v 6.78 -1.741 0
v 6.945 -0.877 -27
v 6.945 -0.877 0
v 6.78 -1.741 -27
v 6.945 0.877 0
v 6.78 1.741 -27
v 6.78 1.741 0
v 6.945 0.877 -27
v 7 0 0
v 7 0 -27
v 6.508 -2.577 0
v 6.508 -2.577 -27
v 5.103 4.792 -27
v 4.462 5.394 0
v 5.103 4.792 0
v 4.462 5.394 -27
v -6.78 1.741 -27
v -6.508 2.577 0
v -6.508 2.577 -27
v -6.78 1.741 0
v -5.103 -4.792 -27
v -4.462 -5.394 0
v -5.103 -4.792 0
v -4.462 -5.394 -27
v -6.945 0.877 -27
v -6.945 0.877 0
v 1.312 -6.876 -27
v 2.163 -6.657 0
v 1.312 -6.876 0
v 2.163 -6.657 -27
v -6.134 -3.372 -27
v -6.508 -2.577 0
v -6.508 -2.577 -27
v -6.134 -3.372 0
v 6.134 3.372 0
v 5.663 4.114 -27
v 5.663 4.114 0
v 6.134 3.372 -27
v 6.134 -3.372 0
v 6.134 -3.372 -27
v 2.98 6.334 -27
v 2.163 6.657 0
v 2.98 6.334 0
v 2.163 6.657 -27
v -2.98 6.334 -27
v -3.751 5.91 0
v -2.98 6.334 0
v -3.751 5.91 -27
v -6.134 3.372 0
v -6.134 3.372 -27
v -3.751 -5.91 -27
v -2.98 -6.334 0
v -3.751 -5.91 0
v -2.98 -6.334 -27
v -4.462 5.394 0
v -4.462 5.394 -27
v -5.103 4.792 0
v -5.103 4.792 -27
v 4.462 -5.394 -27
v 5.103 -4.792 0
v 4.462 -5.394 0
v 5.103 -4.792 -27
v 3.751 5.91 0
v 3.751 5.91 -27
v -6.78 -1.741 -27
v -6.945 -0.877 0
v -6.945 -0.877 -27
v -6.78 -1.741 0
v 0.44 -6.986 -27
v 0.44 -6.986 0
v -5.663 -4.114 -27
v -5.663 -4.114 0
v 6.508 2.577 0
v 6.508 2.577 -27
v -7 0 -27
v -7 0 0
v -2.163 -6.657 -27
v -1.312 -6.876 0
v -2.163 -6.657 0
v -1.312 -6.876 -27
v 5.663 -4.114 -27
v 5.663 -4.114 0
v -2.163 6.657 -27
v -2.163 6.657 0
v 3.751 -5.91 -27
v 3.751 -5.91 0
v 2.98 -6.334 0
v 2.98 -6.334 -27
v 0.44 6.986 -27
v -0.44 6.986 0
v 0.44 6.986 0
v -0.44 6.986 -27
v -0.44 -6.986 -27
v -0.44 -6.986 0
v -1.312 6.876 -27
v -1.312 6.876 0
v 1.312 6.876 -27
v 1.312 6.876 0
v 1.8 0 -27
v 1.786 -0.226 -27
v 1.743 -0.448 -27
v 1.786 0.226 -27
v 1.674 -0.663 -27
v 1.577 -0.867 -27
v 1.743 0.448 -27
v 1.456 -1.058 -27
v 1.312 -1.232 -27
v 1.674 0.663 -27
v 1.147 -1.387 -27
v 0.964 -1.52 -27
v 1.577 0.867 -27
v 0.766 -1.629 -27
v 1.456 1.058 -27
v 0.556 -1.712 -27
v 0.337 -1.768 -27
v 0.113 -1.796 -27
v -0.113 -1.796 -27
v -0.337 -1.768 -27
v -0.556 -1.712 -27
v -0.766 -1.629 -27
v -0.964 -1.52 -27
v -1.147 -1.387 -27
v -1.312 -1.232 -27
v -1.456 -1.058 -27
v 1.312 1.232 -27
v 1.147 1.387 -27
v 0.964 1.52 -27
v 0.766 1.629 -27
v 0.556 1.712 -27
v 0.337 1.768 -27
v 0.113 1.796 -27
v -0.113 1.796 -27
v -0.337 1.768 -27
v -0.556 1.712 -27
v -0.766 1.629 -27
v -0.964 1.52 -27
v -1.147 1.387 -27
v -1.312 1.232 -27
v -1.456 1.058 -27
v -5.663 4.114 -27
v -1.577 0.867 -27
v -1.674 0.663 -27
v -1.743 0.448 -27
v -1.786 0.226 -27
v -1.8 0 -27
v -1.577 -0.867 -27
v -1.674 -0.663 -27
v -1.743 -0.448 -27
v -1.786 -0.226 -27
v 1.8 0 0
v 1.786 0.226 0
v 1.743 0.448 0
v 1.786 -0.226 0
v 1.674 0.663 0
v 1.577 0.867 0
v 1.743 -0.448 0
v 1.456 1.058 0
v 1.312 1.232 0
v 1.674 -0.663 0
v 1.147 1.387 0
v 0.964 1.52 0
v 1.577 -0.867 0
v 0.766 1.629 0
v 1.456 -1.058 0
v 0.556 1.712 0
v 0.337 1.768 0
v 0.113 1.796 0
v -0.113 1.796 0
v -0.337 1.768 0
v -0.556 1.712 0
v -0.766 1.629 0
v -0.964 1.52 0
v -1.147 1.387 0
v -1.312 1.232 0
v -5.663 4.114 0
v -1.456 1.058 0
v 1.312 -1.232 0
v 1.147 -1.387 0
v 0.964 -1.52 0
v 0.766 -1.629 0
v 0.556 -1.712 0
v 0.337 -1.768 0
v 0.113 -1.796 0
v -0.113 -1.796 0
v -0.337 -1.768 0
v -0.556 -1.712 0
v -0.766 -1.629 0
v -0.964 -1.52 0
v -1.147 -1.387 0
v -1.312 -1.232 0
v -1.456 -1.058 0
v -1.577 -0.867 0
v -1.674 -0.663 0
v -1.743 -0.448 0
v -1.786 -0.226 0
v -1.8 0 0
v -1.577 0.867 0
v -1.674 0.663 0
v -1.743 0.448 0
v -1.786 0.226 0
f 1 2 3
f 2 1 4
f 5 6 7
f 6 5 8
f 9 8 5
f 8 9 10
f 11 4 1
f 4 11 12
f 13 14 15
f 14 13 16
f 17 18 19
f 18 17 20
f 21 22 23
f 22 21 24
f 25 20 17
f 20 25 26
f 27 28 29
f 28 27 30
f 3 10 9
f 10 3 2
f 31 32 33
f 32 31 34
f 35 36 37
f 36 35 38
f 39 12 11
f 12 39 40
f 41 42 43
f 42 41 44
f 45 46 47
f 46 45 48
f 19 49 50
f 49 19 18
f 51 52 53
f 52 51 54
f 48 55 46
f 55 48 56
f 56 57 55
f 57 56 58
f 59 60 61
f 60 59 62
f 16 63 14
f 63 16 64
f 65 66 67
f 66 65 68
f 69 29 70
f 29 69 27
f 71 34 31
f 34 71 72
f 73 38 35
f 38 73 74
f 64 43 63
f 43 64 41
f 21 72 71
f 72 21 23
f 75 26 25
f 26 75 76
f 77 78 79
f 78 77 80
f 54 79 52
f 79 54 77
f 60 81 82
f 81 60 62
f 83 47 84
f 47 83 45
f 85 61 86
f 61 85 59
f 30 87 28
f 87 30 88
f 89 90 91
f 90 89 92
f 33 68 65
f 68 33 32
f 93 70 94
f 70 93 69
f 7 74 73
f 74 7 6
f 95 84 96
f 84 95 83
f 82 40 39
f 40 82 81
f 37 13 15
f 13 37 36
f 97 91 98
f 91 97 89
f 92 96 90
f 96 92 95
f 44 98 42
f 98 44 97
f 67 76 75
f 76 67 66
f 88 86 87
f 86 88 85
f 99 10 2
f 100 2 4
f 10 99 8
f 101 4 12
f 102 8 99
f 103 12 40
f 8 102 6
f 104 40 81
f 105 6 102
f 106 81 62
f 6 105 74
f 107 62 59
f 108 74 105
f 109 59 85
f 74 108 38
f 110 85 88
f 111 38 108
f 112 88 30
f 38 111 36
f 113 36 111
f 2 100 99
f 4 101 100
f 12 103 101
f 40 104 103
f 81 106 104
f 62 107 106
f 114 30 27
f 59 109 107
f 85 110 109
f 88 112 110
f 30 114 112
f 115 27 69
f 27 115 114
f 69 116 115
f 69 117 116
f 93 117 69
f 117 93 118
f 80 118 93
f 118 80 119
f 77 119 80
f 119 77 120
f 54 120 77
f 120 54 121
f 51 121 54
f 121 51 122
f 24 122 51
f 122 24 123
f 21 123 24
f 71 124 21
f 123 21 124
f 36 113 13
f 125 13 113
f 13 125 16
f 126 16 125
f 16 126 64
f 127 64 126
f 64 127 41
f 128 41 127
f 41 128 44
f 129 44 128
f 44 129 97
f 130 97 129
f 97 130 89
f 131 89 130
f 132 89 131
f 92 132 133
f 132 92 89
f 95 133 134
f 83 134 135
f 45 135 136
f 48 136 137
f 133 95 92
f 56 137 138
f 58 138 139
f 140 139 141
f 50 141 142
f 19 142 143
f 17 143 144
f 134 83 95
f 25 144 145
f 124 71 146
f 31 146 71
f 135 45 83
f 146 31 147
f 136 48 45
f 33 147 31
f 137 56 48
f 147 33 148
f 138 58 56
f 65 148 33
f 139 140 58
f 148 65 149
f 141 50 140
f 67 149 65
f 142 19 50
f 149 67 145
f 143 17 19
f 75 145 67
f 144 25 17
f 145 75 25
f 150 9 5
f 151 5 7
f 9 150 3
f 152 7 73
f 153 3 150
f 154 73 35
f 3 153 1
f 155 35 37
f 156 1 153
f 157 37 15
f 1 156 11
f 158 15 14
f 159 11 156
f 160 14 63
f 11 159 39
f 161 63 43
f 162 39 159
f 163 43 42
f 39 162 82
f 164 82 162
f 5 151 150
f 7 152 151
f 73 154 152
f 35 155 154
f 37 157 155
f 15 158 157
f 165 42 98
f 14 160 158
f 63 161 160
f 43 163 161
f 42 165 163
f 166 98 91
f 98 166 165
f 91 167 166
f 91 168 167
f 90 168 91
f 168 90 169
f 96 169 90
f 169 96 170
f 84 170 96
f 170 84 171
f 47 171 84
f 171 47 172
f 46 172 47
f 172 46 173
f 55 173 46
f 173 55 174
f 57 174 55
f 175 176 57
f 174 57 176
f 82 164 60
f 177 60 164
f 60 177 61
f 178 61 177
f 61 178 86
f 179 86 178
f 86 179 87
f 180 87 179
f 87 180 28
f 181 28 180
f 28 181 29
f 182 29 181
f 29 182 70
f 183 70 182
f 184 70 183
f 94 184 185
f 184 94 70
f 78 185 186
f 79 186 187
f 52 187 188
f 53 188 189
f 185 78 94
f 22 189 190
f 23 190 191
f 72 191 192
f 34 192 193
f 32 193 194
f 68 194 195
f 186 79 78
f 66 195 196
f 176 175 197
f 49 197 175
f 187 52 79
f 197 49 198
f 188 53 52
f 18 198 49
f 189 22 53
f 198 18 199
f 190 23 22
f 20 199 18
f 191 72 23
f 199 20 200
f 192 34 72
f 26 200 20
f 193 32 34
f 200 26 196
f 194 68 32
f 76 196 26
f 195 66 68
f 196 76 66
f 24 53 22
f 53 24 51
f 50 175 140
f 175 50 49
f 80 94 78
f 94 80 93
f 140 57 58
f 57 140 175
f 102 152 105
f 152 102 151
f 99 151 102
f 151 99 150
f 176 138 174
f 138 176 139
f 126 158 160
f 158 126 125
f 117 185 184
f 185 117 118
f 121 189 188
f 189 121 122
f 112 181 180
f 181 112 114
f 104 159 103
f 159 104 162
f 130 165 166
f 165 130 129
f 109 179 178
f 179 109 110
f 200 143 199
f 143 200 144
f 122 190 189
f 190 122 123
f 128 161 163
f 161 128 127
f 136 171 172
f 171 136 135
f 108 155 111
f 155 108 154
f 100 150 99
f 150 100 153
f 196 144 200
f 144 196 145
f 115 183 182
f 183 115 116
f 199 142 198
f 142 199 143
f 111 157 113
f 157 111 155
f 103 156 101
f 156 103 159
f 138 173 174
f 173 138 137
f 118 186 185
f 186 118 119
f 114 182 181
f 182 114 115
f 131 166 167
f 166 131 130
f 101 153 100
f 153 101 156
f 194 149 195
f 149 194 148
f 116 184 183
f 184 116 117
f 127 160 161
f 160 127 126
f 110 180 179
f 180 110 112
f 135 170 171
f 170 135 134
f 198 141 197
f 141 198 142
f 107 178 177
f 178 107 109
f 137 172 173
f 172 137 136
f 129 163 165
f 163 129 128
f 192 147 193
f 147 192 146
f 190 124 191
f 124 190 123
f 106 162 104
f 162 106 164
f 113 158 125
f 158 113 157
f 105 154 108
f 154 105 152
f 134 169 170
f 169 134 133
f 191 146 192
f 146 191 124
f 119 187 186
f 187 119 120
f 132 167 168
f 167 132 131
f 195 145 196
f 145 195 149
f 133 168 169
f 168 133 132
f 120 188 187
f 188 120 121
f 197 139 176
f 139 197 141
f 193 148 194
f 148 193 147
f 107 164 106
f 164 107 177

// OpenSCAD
$fn = 50;


difference() {
	union() {
		translate(v = [0, 0, -27.0000000000]) {
			cylinder(h = 27, r = 7.0000000000);
		}
		cylinder(h = 0, r = 10.0000000000);
	}
	union() {
		#translate(v = [0, 0, -27]) {
			cylinder(h = 27, r = 1.8000000000);
		}
	}
}
